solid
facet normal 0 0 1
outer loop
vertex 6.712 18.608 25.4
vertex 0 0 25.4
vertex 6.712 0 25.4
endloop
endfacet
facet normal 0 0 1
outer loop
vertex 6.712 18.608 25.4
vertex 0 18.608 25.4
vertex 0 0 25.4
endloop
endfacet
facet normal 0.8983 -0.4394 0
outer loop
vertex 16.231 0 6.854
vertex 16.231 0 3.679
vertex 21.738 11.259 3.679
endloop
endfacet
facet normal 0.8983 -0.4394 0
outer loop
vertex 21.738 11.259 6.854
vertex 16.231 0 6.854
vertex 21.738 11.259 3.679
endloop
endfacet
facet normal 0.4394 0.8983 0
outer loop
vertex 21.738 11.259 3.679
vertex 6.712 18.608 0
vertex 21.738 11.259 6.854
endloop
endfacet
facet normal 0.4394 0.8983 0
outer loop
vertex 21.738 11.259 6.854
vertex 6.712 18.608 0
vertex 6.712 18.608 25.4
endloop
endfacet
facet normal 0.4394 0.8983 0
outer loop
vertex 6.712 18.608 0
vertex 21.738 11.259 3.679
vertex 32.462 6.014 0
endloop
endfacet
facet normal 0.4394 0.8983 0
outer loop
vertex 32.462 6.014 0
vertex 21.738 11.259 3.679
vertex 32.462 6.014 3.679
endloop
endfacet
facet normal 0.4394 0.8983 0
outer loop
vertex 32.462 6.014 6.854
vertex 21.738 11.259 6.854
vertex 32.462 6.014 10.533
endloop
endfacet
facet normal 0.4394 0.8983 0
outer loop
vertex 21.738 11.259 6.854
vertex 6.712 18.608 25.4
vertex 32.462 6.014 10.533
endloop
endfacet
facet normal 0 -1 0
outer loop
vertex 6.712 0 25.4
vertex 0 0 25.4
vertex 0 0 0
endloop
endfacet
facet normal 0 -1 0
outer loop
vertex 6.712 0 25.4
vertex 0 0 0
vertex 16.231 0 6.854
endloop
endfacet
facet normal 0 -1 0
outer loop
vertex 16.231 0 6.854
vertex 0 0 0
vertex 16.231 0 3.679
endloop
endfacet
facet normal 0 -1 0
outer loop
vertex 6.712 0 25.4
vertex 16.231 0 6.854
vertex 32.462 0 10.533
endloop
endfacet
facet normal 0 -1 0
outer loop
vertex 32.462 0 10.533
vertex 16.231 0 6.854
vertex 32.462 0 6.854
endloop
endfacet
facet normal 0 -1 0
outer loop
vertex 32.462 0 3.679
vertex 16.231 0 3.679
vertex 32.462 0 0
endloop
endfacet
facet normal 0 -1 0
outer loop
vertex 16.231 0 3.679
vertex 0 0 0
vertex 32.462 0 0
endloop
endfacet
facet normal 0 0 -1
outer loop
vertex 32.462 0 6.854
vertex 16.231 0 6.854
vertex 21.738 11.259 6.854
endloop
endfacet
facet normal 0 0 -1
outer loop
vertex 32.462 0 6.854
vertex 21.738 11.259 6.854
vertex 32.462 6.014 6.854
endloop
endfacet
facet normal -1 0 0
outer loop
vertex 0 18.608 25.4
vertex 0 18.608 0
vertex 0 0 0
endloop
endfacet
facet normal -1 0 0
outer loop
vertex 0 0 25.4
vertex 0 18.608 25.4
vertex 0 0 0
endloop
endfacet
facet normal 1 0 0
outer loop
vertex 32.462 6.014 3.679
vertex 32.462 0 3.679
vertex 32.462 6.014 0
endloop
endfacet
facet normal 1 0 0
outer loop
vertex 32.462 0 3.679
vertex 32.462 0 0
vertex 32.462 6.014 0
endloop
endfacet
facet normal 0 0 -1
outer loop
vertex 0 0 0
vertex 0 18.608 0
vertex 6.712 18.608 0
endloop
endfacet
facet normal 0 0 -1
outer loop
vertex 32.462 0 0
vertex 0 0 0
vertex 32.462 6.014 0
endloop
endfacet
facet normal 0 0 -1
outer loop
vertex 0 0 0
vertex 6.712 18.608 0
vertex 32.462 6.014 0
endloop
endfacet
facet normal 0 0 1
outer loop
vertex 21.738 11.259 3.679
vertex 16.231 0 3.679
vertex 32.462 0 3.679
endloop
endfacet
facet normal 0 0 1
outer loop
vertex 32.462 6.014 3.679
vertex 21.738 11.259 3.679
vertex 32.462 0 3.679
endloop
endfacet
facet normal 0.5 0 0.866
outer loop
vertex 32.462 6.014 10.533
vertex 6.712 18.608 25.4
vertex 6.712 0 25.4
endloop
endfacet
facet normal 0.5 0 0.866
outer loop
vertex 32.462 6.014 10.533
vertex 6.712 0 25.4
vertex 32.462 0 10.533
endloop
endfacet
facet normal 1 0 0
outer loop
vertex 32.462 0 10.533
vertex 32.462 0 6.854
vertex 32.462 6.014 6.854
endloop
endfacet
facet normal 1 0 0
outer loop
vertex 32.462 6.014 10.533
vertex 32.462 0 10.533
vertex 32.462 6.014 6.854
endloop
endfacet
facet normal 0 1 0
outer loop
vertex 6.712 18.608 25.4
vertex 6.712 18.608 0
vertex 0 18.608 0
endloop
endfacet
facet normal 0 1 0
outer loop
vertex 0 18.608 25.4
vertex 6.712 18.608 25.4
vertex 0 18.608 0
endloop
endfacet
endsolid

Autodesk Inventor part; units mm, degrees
ref_plane "YZ Plane" through (0, 0, 0) normal (1, 0, 0) x (0, 1, 0)
ref_plane "XZ Plane" through (0, 0, 0) normal (0, 1, 0) x (-1, 0, 0)
ref_plane "XY Plane" through (0, 0, 0) normal (0, 0, 1) x (1, 0, 0)
sketch "Sketch1" plane through (0, 0, 0) normal (0, 0, 1) x (1, 0, 0)
  line L0 (0, 0) -> (32.4623, 0)
  line L1 (32.4623, 0) -> (32.4623, 18.6079)
  line L2 (32.4623, 18.6079) -> (0, 18.6079)
  line L3 (0, 18.6079) -> (0, 0)
extrude "Extrusion1" add sketch "Sketch1" along normal blind 25.4
sketch "Sketch2" plane through (0, 0, 25.4) normal (0, 0, 1) x (1, 0, 0)
  line L0 (32.4623, 0) -> (32.4623, 18.6079) projected
  line L1 (32.4623, 18.6079) -> (0, 18.6079) projected
  line L2 (6.7125, 18.6079) -> (32.4623, 6.0135)
extrude "Extrusion2" cut sketch "Sketch2" against normal through all
sketch "Sketch4" plane through (0, 18.6079, 25.4) normal (0, 1, 0) x (1, 0, 0)
  line L0 (0, 25.4) -> (0, 0) projected
  line L1 (6.7125, 25.4) -> (32.4623, 25.4) projected
  line L2 (6.7125, 0) -> (6.7125, 25.4) projected
  line L3 (32.4623, 0) -> (6.7125, 0) projected
  line L4 (32.4623, 25.4) -> (32.4623, 0) projected
  line L5 (6.7125, 0) -> (32.4623, 14.8667)
  dimension "d6" = 30
extrude "Extrusion4" cut sketch "Sketch4" against normal through all contours L5 L4 L3
ref_plane "Work Plane1" through (32.4623, 6.0135, 5.2667) normal (0, 0, 1) x (1, 0, 0)
sketch "Sketch5" plane through (32.4623, 6.0135, 5.2667) normal (0, 0, 1) x (1, 0, 0)
  line L0 (-32.4623, -6.0135) -> (-32.4623, 12.5943) projected
  line L1 (-32.4623, 12.5943) -> (-25.7498, 12.5943) projected
  line L2 (-25.7498, 12.5943) -> (0, 0) projected
  line L3 (0, 0) -> (0, -6.0135) projected
  line L4 (0, -6.0135) -> (-32.4623, -6.0135) projected
  line L5 (-16.2312, -6.0135) -> (-10.7244, 5.2453)
extrude "Extrusion5" cut sketch "Sketch5" along normal mid plane 3.175 contours L5 L2 L3 L4
properties part number "Importing AutoCAD Geometry"
